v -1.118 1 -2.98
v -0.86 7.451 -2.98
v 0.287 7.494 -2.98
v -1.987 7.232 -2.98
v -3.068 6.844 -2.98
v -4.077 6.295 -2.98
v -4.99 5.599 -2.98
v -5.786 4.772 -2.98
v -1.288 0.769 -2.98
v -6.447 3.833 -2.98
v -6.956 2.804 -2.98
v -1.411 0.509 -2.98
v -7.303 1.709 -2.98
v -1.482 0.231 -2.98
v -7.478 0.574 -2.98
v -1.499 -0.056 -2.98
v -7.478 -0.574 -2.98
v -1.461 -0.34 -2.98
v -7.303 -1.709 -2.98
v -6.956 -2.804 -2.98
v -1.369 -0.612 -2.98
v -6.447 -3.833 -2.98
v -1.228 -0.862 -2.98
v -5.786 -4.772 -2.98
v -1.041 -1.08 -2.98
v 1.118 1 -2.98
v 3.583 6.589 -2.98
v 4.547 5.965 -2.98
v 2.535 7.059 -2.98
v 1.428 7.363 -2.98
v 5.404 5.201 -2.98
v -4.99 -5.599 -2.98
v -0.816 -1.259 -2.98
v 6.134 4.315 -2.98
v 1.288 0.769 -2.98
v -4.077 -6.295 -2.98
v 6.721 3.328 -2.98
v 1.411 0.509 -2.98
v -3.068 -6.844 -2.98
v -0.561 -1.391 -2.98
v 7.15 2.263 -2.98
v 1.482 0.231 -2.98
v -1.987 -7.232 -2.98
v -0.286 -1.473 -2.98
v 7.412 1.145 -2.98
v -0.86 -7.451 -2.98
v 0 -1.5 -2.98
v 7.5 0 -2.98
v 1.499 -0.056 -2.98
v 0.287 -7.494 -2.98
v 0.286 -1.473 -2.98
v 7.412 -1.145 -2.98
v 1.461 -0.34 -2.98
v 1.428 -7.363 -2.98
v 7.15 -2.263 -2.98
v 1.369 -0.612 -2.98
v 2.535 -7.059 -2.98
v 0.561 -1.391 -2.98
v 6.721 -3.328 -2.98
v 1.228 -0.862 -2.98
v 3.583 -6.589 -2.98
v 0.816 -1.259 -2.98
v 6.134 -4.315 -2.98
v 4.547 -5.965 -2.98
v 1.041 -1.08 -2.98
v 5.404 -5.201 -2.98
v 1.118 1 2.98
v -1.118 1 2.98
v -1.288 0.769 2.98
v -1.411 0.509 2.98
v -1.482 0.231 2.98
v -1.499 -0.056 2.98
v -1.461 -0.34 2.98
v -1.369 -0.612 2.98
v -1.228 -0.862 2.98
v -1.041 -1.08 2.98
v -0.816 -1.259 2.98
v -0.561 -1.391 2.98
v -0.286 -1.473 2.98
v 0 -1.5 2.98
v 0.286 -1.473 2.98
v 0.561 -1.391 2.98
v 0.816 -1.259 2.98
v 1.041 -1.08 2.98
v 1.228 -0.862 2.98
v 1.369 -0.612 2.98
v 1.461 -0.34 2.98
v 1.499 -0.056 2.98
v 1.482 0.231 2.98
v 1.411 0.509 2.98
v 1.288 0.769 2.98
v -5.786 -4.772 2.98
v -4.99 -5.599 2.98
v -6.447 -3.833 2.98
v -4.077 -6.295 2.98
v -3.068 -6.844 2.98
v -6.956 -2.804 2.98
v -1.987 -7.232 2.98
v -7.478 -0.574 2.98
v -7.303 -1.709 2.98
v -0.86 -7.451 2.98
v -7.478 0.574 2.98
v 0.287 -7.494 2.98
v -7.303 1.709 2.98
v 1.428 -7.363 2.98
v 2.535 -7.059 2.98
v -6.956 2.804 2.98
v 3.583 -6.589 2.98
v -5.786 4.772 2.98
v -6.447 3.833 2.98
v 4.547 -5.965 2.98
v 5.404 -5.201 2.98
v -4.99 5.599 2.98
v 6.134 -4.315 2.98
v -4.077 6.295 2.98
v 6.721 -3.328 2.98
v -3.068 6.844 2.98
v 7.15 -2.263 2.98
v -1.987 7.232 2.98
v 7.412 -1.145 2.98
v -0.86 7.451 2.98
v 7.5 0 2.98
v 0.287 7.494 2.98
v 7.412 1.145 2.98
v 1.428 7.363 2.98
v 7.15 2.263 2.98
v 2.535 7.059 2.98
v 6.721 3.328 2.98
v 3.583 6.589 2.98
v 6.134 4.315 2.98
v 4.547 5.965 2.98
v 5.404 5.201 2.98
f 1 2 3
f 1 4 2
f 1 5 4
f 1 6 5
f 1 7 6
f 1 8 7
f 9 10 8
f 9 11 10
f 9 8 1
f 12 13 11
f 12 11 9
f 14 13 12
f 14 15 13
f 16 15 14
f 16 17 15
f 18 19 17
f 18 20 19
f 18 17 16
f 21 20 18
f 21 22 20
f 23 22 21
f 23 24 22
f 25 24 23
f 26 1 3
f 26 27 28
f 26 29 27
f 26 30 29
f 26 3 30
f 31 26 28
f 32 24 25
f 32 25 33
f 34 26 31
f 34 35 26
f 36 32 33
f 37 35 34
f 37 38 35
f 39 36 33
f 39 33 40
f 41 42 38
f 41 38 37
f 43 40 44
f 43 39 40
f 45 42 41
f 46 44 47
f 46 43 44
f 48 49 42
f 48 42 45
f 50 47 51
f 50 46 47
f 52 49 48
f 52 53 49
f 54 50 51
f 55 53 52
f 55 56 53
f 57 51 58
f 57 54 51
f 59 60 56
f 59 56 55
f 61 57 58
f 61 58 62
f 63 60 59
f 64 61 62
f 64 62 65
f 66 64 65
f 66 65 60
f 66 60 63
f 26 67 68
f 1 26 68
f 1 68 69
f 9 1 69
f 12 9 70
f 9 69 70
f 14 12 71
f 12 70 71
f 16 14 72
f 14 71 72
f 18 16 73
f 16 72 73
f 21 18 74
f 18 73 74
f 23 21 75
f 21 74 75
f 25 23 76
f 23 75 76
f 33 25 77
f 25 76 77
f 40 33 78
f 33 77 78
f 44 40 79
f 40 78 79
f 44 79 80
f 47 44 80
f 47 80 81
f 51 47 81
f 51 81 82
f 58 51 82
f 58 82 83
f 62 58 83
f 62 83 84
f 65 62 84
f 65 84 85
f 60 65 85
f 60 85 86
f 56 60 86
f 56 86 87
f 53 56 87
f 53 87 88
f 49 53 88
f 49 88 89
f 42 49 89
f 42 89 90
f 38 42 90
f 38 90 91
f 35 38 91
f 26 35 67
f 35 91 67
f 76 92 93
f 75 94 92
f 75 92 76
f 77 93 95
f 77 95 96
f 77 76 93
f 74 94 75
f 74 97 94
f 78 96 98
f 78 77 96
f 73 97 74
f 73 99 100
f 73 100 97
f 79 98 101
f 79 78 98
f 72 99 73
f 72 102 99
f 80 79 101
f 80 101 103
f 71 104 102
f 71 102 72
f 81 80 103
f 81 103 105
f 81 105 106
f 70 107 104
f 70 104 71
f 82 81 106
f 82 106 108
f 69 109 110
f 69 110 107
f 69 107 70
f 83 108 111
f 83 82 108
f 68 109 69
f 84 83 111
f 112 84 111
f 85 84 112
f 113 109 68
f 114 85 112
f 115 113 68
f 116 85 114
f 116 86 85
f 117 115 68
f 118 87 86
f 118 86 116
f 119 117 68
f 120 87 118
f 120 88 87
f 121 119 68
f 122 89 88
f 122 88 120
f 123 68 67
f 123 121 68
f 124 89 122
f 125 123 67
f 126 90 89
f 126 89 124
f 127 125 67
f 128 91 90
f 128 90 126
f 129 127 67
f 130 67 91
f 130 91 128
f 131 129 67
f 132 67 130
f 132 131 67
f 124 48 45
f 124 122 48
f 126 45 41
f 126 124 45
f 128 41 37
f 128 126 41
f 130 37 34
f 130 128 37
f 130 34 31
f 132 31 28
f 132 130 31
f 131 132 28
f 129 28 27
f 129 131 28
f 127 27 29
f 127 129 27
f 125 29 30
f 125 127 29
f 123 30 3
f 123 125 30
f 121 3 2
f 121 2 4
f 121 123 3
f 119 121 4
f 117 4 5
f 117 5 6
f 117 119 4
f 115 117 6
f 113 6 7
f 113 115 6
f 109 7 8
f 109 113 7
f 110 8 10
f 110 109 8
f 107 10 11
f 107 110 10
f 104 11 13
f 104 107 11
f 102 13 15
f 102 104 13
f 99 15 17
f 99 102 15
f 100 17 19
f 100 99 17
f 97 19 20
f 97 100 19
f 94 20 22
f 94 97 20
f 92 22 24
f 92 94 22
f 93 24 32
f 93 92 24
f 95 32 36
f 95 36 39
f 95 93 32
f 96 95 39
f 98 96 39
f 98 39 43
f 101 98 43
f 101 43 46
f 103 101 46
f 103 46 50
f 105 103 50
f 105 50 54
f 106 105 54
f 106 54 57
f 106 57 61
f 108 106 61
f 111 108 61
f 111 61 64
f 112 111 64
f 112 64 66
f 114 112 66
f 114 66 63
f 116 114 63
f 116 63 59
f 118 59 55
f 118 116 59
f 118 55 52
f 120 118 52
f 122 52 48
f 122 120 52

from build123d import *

# Parameters (mm, degrees)
SKETCH1_R                       = 7.5
SKETCH1_R_2                     = 2.5
BOSS_EXTRUDE2_DEPTH             = 2.98
BOSS_EXTRUDE3_REACH             = 13.017
SKETCH1_5_R                     = 2.5
BOSS_EXTRUDE3_DIRECTION_2_REACH = 13.017


with BuildPart() as part:
    # Sketch1 → Boss-Extrude2 (new, symmetric)
    with BuildSketch(Plane.XY):
        Circle(SKETCH1_R)
        Circle(SKETCH1_R_2, mode=Mode.SUBTRACT)
    extrude(amount=BOSS_EXTRUDE2_DEPTH, both=True)

    # Boss-Extrude3: up to this face of the body (flat: up to its plane)
    boss_extrude3_end = Plane(part.part.faces().sort_by_distance((-7.287867966, 0, 2.98))[0])
    # Sketch1<5> → Boss-Extrude3 (add, up to the picked face)
    with BuildSketch(Plane.XY, mode=Mode.PRIVATE) as boss_extrude3_sk1:
        Circle(SKETCH1_5_R)
        with BuildLine():
            ThreePointArc((1.118033989, 1), (0, -1.5), (-1.118033989, 1))
            Line((-1.118033989, 1), (1.118033989, 1))
        make_face(mode=Mode.SUBTRACT)
    boss_extrude3_tool1 = split(extrude(boss_extrude3_sk1.sketch, amount=BOSS_EXTRUDE3_REACH, mode=Mode.PRIVATE), bisect_by=boss_extrude3_end, keep=Keep.BOTH, mode=Mode.PRIVATE)
    add(boss_extrude3_tool1.solids().sort_by(Axis((-2.429289, 0, 0), (0, 0, 1)))[0])

    # Boss-Extrude3 direction 2: up to this face of the body (flat: up to its plane)
    boss_extrude3_direction_2_end = Plane(part.part.faces().sort_by_distance((-7.287867966, 0, -2.98))[0])
    # Sketch1<5> → Boss-Extrude3 direction 2 (add, up to the picked face)
    with BuildSketch(Plane.XY, mode=Mode.PRIVATE) as boss_extrude3_direction_2_sk1:
        Circle(SKETCH1_5_R)
        with BuildLine():
            ThreePointArc((1.118033989, 1), (0, -1.5), (-1.118033989, 1))
            Line((-1.118033989, 1), (1.118033989, 1))
        make_face(mode=Mode.SUBTRACT)
    boss_extrude3_direction_2_tool1 = split(extrude(boss_extrude3_direction_2_sk1.sketch, amount=-BOSS_EXTRUDE3_DIRECTION_2_REACH, mode=Mode.PRIVATE), bisect_by=boss_extrude3_direction_2_end, keep=Keep.BOTH, mode=Mode.PRIVATE)
    add(boss_extrude3_direction_2_tool1.solids().sort_by(Axis((-2.429289, 0, 0), (0, 0, -1)))[0])


solid = part.part
